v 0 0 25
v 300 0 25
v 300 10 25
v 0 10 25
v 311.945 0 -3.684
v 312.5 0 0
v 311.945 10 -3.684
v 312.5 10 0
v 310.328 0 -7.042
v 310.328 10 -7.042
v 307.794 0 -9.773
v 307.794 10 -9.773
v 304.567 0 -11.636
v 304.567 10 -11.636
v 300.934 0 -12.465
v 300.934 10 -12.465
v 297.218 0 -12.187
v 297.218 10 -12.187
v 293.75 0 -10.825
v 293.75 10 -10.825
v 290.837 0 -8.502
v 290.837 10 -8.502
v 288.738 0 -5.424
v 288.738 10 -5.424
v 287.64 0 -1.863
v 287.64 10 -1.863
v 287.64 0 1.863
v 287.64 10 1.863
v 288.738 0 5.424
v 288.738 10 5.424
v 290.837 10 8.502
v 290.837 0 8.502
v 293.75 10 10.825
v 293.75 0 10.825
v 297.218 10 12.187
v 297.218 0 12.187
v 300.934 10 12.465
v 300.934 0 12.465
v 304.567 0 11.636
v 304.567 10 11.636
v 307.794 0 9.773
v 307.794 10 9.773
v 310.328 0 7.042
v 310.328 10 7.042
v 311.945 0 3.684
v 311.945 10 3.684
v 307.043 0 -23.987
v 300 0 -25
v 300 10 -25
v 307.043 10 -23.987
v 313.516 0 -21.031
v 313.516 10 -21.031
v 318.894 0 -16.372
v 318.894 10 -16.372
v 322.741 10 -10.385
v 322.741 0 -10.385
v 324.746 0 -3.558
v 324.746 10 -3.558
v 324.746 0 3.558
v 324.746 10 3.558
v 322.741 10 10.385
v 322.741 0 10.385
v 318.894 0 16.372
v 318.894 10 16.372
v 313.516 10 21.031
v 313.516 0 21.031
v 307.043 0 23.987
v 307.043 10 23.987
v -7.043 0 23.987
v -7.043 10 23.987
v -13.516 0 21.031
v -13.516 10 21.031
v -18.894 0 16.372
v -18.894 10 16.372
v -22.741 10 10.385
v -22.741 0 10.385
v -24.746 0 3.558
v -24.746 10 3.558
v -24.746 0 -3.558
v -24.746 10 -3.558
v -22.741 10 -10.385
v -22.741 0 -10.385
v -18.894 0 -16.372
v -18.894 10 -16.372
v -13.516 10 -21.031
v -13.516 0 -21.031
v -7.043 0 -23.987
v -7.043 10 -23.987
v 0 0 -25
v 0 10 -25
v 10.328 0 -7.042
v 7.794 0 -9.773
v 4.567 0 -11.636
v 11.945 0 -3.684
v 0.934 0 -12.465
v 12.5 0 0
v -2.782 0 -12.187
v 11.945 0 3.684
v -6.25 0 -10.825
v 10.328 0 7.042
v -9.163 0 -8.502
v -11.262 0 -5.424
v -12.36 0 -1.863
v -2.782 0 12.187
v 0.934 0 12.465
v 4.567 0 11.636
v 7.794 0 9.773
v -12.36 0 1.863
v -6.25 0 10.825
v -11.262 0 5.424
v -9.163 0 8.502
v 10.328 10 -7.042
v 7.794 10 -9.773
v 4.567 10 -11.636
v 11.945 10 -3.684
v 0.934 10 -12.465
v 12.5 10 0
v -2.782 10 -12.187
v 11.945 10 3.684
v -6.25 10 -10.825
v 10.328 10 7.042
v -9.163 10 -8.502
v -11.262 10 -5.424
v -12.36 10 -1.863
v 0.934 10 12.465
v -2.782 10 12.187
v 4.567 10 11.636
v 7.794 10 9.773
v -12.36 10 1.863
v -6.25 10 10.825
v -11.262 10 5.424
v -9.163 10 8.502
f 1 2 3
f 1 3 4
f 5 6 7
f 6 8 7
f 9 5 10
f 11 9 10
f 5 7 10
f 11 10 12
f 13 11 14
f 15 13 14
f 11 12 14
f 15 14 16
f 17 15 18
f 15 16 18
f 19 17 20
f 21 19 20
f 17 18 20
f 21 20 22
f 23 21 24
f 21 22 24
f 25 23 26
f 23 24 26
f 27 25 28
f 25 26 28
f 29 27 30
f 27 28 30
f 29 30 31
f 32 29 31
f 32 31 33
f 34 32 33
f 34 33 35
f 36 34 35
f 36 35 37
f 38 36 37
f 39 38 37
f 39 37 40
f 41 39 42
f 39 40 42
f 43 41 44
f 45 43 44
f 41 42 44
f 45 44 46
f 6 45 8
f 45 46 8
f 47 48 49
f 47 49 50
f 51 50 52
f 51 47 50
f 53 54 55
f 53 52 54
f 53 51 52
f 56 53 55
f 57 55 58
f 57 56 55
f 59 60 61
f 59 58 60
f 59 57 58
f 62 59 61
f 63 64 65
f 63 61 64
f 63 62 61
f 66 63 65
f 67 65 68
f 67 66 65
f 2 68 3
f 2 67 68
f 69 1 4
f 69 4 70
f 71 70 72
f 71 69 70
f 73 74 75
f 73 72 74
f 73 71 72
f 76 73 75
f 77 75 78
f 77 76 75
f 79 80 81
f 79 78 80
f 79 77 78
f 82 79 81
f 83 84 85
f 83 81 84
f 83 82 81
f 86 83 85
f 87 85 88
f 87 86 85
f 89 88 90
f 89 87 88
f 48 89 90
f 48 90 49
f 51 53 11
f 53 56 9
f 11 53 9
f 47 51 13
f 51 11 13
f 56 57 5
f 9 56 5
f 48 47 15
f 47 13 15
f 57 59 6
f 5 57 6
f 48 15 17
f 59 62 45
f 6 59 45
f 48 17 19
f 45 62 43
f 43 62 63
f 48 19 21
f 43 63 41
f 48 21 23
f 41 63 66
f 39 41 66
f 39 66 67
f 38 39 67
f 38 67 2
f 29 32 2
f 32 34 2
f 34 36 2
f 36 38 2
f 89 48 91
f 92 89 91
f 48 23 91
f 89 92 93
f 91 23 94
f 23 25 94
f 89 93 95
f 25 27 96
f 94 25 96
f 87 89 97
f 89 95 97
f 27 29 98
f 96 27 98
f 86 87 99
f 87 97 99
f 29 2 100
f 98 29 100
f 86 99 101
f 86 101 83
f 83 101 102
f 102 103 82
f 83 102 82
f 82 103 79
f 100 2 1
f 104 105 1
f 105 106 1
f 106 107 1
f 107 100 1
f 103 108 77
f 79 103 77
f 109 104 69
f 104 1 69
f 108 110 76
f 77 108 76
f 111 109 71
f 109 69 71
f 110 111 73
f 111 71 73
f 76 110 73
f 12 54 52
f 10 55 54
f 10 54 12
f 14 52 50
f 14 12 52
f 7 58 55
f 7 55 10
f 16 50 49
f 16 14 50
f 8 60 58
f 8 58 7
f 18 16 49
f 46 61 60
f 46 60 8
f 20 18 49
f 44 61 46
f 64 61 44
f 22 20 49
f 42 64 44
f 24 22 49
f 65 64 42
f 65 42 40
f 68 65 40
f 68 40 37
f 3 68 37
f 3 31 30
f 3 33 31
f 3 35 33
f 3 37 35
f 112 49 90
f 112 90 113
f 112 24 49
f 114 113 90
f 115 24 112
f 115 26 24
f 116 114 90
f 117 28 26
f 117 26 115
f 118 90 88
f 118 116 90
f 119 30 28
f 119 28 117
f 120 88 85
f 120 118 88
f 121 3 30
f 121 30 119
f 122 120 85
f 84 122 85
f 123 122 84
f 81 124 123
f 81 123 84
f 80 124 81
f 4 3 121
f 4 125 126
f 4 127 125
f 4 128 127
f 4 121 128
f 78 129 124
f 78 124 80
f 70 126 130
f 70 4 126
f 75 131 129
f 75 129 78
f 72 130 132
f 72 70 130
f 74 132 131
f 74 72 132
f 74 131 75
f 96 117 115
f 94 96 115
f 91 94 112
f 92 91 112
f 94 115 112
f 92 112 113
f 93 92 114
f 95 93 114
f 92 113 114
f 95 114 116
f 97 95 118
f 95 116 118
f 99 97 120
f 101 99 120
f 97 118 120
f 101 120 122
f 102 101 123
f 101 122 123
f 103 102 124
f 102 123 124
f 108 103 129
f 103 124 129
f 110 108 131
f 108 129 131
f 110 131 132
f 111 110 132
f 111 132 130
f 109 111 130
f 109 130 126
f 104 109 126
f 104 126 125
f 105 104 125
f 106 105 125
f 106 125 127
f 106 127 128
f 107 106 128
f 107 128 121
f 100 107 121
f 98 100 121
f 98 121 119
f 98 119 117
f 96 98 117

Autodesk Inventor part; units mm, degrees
ref_plane "YZ Plane" through (0, 0, 0) normal (1, 0, 0) x (0, 1, 0)
ref_plane "XZ Plane" through (0, 0, 0) normal (0, 1, 0) x (-1, 0, 0)
ref_plane "XY Plane" through (0, 0, 0) normal (0, 0, 1) x (1, 0, 0)
sketch "草圖1" plane through (0, 0, 0) normal (0, 1, 0) x (-1, 0, 0)
  arc A0 (0, -25) -> (0, 25) centre (0, 0) ccw
  line L0 (0, -25) -> (-300, -25)
  line L1 (-300, -25) -> (-300, 25) construction
  line L2 (-300, 25) -> (0, 25)
  line L3 (0, 25) -> (0, -25) construction
  arc A1 (-300, 25) -> (-300, -25) centre (-300, 0) ccw
  dimension "diameter" = 50
  dimension "center_length" = 300
extrude "thickness" add sketch "草圖1" along normal blind 10
sketch "草圖2" plane through (0, 10, 0) normal (0, 1, 0) x (1, 0, 0)
  circle A0 centre (0, 0) radius 12.5
  arc A1 (0, 25) -> (0, -25) centre (0, 0) ccw construction
  line L0 (0, -25) -> (300, -25) construction
  arc A2 (300, -25) -> (300, 25) centre (300, 0) ccw construction
  line L1 (300, 25) -> (0, 25) construction
  circle A3 centre (300, 0) radius 12.5
  dimension "hole" = 25
extrude "擠出2" cut sketch "草圖2" against normal up to surface (10 mm away)
properties part number "test"
